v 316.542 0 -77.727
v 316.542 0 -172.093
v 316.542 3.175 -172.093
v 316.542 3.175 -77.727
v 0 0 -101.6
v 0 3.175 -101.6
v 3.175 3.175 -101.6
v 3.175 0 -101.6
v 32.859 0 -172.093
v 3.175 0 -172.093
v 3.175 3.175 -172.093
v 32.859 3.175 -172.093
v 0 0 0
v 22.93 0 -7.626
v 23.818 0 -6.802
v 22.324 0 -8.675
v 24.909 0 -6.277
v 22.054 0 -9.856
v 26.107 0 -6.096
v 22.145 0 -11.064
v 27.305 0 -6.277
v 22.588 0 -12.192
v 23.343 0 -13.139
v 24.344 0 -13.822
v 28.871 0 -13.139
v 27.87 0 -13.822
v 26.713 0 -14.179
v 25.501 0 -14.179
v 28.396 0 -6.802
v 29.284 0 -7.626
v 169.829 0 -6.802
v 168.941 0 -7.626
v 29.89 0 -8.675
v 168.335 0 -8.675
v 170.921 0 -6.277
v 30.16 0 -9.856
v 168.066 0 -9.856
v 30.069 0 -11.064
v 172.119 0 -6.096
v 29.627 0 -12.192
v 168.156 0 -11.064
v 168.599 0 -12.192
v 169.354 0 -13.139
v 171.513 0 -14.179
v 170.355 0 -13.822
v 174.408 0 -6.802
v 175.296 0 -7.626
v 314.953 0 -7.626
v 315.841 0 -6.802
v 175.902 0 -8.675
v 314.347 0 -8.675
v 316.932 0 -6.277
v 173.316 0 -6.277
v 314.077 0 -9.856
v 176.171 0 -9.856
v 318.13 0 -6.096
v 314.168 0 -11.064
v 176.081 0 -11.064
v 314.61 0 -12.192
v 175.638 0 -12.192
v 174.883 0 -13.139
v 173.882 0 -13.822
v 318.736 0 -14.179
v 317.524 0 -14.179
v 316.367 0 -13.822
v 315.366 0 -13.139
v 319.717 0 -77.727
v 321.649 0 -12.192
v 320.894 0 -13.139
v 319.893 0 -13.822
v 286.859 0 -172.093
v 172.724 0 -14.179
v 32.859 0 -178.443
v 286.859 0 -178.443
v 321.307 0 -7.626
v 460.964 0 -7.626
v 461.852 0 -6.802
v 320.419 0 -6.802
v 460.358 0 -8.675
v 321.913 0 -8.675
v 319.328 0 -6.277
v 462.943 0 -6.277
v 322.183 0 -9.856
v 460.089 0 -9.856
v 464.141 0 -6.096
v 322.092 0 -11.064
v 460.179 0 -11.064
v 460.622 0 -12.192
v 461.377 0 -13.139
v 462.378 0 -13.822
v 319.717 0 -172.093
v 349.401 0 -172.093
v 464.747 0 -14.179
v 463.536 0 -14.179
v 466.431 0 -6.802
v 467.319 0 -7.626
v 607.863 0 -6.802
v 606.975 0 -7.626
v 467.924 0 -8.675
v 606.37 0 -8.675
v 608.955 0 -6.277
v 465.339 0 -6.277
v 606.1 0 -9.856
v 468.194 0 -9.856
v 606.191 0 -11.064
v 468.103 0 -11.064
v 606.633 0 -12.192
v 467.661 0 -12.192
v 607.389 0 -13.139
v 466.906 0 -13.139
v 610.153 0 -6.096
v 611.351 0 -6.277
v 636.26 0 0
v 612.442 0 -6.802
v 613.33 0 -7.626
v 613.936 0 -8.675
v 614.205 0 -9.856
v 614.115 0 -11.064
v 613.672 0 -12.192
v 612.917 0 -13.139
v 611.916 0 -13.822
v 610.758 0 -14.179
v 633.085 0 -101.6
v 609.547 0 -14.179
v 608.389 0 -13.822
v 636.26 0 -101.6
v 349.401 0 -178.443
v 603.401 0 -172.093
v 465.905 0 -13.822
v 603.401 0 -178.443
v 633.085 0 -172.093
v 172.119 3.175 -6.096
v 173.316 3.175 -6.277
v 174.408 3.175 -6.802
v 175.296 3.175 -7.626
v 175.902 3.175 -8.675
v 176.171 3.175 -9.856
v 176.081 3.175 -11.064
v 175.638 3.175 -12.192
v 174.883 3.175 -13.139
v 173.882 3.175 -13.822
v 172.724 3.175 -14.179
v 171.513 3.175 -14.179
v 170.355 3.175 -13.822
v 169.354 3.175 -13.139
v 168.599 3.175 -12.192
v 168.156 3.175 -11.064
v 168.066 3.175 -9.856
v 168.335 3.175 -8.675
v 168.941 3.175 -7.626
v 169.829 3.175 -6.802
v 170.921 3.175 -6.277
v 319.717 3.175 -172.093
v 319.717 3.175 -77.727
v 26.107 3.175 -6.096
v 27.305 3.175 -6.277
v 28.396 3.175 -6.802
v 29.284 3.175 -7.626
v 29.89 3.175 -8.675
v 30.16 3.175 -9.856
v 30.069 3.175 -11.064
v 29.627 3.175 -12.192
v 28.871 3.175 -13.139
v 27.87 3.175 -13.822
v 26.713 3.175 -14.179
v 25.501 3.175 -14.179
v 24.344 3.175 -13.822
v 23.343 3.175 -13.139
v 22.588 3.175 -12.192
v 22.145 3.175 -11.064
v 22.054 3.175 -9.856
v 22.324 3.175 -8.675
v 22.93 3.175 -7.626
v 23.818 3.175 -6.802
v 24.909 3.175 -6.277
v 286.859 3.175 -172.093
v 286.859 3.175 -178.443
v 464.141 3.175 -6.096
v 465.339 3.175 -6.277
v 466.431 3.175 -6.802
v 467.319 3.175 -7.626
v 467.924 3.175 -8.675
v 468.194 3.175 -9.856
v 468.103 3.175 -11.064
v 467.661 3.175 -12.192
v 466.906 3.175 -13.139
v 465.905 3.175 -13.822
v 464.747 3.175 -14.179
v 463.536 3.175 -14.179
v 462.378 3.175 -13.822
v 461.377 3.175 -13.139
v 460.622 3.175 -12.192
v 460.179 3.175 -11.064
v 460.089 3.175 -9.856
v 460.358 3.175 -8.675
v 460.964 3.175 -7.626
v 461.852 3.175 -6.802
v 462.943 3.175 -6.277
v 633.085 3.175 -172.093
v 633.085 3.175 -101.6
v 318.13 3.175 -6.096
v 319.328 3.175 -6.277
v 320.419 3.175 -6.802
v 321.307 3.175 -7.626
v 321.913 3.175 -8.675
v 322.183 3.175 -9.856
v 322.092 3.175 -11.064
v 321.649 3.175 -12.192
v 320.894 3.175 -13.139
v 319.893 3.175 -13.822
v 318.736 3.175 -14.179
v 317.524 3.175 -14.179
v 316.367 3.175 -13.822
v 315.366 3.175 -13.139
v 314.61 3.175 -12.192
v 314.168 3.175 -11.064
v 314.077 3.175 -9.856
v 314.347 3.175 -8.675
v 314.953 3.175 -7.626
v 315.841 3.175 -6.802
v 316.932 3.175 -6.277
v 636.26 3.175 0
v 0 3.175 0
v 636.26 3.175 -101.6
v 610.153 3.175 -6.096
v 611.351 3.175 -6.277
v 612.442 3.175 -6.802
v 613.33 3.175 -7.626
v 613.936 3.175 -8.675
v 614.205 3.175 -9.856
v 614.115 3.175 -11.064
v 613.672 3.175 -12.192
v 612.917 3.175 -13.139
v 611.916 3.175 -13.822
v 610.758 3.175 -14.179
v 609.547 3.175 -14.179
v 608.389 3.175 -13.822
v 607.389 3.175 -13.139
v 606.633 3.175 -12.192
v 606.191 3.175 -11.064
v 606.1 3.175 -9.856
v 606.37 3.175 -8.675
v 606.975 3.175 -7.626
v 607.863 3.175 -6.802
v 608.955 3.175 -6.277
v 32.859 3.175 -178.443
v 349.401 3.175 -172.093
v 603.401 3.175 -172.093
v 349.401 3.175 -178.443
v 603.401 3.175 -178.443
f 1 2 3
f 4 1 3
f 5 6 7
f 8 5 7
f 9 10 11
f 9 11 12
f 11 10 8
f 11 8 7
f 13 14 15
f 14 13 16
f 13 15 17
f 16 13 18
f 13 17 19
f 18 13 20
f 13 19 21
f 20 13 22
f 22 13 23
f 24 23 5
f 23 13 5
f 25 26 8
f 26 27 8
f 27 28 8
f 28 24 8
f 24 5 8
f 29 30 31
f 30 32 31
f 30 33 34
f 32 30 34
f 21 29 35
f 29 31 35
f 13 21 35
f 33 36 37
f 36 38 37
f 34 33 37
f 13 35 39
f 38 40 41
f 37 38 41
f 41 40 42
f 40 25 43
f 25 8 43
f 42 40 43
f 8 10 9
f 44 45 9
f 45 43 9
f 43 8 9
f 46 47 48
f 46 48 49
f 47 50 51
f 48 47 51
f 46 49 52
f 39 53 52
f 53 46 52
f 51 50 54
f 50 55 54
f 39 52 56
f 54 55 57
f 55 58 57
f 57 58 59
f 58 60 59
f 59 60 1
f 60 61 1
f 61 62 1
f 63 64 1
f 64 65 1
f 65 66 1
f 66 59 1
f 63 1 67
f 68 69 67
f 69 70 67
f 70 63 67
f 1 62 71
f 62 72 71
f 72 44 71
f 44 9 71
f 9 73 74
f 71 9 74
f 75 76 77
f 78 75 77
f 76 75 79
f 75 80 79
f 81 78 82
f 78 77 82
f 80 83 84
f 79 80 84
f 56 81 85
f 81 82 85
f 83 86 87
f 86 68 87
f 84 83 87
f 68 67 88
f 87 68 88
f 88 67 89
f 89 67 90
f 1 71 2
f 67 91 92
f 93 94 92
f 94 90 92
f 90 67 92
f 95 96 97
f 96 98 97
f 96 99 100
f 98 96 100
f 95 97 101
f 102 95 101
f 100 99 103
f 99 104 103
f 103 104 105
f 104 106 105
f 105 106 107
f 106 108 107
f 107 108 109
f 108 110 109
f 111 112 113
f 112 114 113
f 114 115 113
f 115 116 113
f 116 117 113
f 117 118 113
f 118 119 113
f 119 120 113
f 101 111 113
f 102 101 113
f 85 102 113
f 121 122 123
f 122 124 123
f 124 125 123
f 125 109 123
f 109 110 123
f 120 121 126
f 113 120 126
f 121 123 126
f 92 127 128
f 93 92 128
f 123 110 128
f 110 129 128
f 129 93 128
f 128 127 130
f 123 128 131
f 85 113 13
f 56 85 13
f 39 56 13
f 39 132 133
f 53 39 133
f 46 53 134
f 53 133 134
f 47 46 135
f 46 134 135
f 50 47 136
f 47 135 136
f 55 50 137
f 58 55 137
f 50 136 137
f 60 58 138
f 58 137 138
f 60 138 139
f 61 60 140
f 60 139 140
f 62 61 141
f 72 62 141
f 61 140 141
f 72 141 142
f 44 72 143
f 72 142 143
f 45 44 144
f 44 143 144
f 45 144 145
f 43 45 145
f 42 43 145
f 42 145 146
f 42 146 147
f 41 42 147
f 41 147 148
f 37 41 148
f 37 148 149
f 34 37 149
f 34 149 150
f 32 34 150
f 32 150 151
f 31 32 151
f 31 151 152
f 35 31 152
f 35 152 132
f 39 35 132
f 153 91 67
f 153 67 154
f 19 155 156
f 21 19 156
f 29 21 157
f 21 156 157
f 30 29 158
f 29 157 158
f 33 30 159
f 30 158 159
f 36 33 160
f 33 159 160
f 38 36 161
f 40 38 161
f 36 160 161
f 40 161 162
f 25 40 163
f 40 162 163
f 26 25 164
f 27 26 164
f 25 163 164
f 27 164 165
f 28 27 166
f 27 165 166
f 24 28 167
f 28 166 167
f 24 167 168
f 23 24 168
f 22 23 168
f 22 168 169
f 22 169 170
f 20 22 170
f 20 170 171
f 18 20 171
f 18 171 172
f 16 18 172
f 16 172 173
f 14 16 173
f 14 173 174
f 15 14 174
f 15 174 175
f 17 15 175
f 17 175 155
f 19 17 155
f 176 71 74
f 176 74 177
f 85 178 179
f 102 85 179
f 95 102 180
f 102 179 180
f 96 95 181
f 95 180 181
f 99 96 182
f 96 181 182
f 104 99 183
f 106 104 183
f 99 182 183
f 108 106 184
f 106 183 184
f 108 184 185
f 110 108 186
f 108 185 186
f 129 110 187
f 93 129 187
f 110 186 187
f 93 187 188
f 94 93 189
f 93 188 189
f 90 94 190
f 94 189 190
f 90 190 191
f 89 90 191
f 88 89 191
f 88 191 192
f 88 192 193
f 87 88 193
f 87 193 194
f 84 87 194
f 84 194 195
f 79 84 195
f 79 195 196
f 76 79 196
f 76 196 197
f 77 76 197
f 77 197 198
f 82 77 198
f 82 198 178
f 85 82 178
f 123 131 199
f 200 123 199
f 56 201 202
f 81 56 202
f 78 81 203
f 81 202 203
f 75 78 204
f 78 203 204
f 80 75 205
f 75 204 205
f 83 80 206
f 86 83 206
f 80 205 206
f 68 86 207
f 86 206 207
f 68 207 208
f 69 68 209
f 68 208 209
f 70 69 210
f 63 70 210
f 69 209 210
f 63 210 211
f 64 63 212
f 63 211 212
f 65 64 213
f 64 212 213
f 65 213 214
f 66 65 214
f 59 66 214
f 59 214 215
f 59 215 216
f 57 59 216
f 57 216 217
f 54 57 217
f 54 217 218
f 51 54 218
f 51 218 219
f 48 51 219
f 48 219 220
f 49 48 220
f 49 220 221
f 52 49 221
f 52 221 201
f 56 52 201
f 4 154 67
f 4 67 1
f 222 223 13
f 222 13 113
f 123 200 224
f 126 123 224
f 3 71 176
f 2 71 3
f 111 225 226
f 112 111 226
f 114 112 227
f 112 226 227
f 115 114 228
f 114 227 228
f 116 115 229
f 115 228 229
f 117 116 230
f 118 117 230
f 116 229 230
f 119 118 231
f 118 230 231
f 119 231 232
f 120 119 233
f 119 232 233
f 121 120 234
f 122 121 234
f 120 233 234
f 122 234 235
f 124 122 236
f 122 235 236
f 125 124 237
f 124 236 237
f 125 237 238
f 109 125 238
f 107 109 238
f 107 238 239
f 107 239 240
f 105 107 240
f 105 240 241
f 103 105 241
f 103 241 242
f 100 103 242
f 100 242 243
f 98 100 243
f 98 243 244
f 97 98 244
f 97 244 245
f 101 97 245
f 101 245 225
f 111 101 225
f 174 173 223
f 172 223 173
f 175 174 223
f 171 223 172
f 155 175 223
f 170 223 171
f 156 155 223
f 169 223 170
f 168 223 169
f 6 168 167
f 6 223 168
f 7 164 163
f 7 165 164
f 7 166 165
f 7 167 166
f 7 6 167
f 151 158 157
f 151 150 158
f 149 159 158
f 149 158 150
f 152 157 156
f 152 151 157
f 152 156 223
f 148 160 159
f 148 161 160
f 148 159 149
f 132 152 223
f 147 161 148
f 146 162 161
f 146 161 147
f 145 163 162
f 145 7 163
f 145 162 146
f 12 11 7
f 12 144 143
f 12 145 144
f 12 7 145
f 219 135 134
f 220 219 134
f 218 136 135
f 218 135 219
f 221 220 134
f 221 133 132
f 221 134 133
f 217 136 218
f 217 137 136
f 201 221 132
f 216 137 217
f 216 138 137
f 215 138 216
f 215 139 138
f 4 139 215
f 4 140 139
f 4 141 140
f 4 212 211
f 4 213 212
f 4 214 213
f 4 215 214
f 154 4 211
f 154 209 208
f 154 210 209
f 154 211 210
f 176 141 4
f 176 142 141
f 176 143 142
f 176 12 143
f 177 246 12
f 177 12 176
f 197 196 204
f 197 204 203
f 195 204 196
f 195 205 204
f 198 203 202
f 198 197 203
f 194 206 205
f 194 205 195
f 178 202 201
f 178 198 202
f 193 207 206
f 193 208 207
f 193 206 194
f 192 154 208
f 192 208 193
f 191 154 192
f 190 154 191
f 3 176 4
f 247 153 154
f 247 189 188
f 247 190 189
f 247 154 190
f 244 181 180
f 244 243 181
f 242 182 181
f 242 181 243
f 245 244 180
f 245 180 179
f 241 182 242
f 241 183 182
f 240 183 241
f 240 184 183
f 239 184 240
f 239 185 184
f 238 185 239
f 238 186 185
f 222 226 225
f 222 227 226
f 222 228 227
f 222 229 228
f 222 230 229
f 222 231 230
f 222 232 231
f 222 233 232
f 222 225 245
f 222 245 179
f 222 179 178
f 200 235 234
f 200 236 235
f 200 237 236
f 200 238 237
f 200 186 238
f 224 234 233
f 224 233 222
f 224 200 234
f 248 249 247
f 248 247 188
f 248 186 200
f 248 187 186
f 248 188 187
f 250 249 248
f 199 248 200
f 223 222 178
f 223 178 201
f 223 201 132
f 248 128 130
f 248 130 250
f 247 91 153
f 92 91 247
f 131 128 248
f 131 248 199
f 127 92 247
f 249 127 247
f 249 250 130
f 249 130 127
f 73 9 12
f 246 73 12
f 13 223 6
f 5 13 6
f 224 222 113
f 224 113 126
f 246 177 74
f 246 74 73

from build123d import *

# Parameters (mm, degrees)
SKETCH1_W           = 636.25984
SKETCH1_H           = 172.09262
BOSS_EXTRUDE1_DEPTH = 3.175
SKETCH2_W           = 3.175
SKETCH2_H           = 3.175
CUT_EXTRUDE1_DEPTH  = 94.36608
SKETCH3_W           = 3.175
SKETCH3_H           = 3.175
CUT_EXTRUDE5_DEPTH  = 70.49262
SKETCH4_W           = 636.25984
SKETCH4_H           = 24.39416
CUT_EXTRUDE6_DEPTH  = 660.130134708
SKETCH6_W           = 636.25984
SKETCH6_H           = 24.39416
BOSS_EXTRUDE2_DEPTH = 3.175
SKETCH7_W           = 254
SKETCH7_H           = 3.175
BOSS_EXTRUDE3_DEPTH = 6.35
SKETCH8_R           = 4.064
CUT_EXTRUDE7_DEPTH  = 661.816489847


with BuildPart() as part:
    # Sketch1 → Boss-Extrude1 (new body)
    with BuildSketch(Plane(origin=(0, 0, 0), x_dir=(1, 0, 0), z_dir=(0, 1, 0))):
        with Locations((318.12992, 86.04631)):
            Rectangle(SKETCH1_W, SKETCH1_H)
    extrude(amount=BOSS_EXTRUDE1_DEPTH)

    # Sketch2 → Cut-Extrude1 (cut)
    with BuildSketch(Plane(origin=(0, 0, -172.09262), x_dir=(-1, 0, 0), z_dir=(0, 0, -1))):
        with Locations((-318.12992, 1.5875)):
            Rectangle(SKETCH2_W, SKETCH2_H)
    extrude(amount=-CUT_EXTRUDE1_DEPTH, mode=Mode.SUBTRACT)

    # Sketch3 → Cut-Extrude5 (cut)
    with BuildSketch(Plane.XY.offset(-172.09262)):
        with Locations((1.5875, 1.5875)):
            Rectangle(SKETCH3_W, SKETCH3_H)
        with Locations((634.67234, 1.5875)):
            Rectangle(SKETCH3_W, SKETCH3_H)
    extrude(amount=CUT_EXTRUDE5_DEPTH, mode=Mode.SUBTRACT)

    # Sketch4 → Cut-Extrude6 (cut, through all)
    with BuildSketch(Plane(origin=(0, 3.175, 0), x_dir=(1, 0, 0), z_dir=(0, 1, 0))):
        with Locations((318.12992, 12.19708)):
            Rectangle(SKETCH4_W, SKETCH4_H)
    extrude(amount=-CUT_EXTRUDE6_DEPTH, mode=Mode.SUBTRACT)

    # Sketch6 → Boss-Extrude2 (add, through all)
    with BuildSketch(Plane(origin=(0, 3.175, 0), x_dir=(1, 0, 0), z_dir=(0, 1, 0))):
        with Locations((318.12992, 12.19708)):
            Rectangle(SKETCH6_W, SKETCH6_H)
    extrude(amount=-BOSS_EXTRUDE2_DEPTH)

    # Sketch7 → Boss-Extrude3 (add)
    with BuildSketch(Plane(origin=(0, 0, -172.09262), x_dir=(-1, 0, 0), z_dir=(0, 0, -1))):
        with Locations((-476.40113, 1.5875)):
            Rectangle(SKETCH7_W, SKETCH7_H)
        with Locations((-159.85871, 1.5875)):
            Rectangle(SKETCH7_W, SKETCH7_H)
    extrude(amount=BOSS_EXTRUDE3_DEPTH)

    # Sketch8 → Cut-Extrude7 (cut, through all)
    with BuildSketch(Plane(origin=(0, 3.175, 0), x_dir=(1, 0, 0), z_dir=(0, 1, 0))):
        with Locations(Location((26.107106781, 10.16, 0), (0, 0, 270))):
            Circle(SKETCH8_R)
        with Locations(Location((172.118513391, 10.16, 0), (0, 0, 270))):
            Circle(SKETCH8_R)
        with Locations(Location((318.12992, 10.16, 0), (0, 0, 270))):
            Circle(SKETCH8_R)
        with Locations(Location((464.141326609, 10.16, 0), (0, 0, 270))):
            Circle(SKETCH8_R)
        with Locations(Location((610.152733219, 10.16, 0), (0, 0, 270))):
            Circle(SKETCH8_R)
    extrude(amount=-CUT_EXTRUDE7_DEPTH, mode=Mode.SUBTRACT)


solid = part.part
